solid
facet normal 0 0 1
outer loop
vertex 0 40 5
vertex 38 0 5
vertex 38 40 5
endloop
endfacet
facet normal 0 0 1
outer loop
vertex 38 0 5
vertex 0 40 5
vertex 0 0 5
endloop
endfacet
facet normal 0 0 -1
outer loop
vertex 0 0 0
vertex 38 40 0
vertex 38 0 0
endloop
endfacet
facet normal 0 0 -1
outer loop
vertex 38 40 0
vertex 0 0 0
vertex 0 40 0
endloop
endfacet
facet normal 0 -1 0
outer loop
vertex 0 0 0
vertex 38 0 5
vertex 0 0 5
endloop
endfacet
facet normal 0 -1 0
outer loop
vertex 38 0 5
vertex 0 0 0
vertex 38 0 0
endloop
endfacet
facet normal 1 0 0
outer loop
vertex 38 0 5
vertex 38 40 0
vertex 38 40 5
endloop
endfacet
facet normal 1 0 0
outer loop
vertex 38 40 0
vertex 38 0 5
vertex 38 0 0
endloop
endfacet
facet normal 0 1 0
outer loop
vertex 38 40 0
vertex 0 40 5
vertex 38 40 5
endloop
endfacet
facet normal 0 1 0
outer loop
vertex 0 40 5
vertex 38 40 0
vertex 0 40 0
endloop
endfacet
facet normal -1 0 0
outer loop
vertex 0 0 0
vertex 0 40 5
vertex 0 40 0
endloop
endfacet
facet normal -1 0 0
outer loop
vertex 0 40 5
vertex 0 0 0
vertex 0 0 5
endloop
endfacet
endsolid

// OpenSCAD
// Noctua NH-L12S CPU Contact Base
// Copper contact plate that sits on the CPU

module nh_l12s_cpu_base() {
    base_w = 38;
    base_d = 40;
    base_h = 5;

    // Copper colored contact plate
    color([0.72, 0.45, 0.2]) {
        cube([base_w, base_d, base_h]);
    }
}

// Preview
nh_l12s_cpu_base();
